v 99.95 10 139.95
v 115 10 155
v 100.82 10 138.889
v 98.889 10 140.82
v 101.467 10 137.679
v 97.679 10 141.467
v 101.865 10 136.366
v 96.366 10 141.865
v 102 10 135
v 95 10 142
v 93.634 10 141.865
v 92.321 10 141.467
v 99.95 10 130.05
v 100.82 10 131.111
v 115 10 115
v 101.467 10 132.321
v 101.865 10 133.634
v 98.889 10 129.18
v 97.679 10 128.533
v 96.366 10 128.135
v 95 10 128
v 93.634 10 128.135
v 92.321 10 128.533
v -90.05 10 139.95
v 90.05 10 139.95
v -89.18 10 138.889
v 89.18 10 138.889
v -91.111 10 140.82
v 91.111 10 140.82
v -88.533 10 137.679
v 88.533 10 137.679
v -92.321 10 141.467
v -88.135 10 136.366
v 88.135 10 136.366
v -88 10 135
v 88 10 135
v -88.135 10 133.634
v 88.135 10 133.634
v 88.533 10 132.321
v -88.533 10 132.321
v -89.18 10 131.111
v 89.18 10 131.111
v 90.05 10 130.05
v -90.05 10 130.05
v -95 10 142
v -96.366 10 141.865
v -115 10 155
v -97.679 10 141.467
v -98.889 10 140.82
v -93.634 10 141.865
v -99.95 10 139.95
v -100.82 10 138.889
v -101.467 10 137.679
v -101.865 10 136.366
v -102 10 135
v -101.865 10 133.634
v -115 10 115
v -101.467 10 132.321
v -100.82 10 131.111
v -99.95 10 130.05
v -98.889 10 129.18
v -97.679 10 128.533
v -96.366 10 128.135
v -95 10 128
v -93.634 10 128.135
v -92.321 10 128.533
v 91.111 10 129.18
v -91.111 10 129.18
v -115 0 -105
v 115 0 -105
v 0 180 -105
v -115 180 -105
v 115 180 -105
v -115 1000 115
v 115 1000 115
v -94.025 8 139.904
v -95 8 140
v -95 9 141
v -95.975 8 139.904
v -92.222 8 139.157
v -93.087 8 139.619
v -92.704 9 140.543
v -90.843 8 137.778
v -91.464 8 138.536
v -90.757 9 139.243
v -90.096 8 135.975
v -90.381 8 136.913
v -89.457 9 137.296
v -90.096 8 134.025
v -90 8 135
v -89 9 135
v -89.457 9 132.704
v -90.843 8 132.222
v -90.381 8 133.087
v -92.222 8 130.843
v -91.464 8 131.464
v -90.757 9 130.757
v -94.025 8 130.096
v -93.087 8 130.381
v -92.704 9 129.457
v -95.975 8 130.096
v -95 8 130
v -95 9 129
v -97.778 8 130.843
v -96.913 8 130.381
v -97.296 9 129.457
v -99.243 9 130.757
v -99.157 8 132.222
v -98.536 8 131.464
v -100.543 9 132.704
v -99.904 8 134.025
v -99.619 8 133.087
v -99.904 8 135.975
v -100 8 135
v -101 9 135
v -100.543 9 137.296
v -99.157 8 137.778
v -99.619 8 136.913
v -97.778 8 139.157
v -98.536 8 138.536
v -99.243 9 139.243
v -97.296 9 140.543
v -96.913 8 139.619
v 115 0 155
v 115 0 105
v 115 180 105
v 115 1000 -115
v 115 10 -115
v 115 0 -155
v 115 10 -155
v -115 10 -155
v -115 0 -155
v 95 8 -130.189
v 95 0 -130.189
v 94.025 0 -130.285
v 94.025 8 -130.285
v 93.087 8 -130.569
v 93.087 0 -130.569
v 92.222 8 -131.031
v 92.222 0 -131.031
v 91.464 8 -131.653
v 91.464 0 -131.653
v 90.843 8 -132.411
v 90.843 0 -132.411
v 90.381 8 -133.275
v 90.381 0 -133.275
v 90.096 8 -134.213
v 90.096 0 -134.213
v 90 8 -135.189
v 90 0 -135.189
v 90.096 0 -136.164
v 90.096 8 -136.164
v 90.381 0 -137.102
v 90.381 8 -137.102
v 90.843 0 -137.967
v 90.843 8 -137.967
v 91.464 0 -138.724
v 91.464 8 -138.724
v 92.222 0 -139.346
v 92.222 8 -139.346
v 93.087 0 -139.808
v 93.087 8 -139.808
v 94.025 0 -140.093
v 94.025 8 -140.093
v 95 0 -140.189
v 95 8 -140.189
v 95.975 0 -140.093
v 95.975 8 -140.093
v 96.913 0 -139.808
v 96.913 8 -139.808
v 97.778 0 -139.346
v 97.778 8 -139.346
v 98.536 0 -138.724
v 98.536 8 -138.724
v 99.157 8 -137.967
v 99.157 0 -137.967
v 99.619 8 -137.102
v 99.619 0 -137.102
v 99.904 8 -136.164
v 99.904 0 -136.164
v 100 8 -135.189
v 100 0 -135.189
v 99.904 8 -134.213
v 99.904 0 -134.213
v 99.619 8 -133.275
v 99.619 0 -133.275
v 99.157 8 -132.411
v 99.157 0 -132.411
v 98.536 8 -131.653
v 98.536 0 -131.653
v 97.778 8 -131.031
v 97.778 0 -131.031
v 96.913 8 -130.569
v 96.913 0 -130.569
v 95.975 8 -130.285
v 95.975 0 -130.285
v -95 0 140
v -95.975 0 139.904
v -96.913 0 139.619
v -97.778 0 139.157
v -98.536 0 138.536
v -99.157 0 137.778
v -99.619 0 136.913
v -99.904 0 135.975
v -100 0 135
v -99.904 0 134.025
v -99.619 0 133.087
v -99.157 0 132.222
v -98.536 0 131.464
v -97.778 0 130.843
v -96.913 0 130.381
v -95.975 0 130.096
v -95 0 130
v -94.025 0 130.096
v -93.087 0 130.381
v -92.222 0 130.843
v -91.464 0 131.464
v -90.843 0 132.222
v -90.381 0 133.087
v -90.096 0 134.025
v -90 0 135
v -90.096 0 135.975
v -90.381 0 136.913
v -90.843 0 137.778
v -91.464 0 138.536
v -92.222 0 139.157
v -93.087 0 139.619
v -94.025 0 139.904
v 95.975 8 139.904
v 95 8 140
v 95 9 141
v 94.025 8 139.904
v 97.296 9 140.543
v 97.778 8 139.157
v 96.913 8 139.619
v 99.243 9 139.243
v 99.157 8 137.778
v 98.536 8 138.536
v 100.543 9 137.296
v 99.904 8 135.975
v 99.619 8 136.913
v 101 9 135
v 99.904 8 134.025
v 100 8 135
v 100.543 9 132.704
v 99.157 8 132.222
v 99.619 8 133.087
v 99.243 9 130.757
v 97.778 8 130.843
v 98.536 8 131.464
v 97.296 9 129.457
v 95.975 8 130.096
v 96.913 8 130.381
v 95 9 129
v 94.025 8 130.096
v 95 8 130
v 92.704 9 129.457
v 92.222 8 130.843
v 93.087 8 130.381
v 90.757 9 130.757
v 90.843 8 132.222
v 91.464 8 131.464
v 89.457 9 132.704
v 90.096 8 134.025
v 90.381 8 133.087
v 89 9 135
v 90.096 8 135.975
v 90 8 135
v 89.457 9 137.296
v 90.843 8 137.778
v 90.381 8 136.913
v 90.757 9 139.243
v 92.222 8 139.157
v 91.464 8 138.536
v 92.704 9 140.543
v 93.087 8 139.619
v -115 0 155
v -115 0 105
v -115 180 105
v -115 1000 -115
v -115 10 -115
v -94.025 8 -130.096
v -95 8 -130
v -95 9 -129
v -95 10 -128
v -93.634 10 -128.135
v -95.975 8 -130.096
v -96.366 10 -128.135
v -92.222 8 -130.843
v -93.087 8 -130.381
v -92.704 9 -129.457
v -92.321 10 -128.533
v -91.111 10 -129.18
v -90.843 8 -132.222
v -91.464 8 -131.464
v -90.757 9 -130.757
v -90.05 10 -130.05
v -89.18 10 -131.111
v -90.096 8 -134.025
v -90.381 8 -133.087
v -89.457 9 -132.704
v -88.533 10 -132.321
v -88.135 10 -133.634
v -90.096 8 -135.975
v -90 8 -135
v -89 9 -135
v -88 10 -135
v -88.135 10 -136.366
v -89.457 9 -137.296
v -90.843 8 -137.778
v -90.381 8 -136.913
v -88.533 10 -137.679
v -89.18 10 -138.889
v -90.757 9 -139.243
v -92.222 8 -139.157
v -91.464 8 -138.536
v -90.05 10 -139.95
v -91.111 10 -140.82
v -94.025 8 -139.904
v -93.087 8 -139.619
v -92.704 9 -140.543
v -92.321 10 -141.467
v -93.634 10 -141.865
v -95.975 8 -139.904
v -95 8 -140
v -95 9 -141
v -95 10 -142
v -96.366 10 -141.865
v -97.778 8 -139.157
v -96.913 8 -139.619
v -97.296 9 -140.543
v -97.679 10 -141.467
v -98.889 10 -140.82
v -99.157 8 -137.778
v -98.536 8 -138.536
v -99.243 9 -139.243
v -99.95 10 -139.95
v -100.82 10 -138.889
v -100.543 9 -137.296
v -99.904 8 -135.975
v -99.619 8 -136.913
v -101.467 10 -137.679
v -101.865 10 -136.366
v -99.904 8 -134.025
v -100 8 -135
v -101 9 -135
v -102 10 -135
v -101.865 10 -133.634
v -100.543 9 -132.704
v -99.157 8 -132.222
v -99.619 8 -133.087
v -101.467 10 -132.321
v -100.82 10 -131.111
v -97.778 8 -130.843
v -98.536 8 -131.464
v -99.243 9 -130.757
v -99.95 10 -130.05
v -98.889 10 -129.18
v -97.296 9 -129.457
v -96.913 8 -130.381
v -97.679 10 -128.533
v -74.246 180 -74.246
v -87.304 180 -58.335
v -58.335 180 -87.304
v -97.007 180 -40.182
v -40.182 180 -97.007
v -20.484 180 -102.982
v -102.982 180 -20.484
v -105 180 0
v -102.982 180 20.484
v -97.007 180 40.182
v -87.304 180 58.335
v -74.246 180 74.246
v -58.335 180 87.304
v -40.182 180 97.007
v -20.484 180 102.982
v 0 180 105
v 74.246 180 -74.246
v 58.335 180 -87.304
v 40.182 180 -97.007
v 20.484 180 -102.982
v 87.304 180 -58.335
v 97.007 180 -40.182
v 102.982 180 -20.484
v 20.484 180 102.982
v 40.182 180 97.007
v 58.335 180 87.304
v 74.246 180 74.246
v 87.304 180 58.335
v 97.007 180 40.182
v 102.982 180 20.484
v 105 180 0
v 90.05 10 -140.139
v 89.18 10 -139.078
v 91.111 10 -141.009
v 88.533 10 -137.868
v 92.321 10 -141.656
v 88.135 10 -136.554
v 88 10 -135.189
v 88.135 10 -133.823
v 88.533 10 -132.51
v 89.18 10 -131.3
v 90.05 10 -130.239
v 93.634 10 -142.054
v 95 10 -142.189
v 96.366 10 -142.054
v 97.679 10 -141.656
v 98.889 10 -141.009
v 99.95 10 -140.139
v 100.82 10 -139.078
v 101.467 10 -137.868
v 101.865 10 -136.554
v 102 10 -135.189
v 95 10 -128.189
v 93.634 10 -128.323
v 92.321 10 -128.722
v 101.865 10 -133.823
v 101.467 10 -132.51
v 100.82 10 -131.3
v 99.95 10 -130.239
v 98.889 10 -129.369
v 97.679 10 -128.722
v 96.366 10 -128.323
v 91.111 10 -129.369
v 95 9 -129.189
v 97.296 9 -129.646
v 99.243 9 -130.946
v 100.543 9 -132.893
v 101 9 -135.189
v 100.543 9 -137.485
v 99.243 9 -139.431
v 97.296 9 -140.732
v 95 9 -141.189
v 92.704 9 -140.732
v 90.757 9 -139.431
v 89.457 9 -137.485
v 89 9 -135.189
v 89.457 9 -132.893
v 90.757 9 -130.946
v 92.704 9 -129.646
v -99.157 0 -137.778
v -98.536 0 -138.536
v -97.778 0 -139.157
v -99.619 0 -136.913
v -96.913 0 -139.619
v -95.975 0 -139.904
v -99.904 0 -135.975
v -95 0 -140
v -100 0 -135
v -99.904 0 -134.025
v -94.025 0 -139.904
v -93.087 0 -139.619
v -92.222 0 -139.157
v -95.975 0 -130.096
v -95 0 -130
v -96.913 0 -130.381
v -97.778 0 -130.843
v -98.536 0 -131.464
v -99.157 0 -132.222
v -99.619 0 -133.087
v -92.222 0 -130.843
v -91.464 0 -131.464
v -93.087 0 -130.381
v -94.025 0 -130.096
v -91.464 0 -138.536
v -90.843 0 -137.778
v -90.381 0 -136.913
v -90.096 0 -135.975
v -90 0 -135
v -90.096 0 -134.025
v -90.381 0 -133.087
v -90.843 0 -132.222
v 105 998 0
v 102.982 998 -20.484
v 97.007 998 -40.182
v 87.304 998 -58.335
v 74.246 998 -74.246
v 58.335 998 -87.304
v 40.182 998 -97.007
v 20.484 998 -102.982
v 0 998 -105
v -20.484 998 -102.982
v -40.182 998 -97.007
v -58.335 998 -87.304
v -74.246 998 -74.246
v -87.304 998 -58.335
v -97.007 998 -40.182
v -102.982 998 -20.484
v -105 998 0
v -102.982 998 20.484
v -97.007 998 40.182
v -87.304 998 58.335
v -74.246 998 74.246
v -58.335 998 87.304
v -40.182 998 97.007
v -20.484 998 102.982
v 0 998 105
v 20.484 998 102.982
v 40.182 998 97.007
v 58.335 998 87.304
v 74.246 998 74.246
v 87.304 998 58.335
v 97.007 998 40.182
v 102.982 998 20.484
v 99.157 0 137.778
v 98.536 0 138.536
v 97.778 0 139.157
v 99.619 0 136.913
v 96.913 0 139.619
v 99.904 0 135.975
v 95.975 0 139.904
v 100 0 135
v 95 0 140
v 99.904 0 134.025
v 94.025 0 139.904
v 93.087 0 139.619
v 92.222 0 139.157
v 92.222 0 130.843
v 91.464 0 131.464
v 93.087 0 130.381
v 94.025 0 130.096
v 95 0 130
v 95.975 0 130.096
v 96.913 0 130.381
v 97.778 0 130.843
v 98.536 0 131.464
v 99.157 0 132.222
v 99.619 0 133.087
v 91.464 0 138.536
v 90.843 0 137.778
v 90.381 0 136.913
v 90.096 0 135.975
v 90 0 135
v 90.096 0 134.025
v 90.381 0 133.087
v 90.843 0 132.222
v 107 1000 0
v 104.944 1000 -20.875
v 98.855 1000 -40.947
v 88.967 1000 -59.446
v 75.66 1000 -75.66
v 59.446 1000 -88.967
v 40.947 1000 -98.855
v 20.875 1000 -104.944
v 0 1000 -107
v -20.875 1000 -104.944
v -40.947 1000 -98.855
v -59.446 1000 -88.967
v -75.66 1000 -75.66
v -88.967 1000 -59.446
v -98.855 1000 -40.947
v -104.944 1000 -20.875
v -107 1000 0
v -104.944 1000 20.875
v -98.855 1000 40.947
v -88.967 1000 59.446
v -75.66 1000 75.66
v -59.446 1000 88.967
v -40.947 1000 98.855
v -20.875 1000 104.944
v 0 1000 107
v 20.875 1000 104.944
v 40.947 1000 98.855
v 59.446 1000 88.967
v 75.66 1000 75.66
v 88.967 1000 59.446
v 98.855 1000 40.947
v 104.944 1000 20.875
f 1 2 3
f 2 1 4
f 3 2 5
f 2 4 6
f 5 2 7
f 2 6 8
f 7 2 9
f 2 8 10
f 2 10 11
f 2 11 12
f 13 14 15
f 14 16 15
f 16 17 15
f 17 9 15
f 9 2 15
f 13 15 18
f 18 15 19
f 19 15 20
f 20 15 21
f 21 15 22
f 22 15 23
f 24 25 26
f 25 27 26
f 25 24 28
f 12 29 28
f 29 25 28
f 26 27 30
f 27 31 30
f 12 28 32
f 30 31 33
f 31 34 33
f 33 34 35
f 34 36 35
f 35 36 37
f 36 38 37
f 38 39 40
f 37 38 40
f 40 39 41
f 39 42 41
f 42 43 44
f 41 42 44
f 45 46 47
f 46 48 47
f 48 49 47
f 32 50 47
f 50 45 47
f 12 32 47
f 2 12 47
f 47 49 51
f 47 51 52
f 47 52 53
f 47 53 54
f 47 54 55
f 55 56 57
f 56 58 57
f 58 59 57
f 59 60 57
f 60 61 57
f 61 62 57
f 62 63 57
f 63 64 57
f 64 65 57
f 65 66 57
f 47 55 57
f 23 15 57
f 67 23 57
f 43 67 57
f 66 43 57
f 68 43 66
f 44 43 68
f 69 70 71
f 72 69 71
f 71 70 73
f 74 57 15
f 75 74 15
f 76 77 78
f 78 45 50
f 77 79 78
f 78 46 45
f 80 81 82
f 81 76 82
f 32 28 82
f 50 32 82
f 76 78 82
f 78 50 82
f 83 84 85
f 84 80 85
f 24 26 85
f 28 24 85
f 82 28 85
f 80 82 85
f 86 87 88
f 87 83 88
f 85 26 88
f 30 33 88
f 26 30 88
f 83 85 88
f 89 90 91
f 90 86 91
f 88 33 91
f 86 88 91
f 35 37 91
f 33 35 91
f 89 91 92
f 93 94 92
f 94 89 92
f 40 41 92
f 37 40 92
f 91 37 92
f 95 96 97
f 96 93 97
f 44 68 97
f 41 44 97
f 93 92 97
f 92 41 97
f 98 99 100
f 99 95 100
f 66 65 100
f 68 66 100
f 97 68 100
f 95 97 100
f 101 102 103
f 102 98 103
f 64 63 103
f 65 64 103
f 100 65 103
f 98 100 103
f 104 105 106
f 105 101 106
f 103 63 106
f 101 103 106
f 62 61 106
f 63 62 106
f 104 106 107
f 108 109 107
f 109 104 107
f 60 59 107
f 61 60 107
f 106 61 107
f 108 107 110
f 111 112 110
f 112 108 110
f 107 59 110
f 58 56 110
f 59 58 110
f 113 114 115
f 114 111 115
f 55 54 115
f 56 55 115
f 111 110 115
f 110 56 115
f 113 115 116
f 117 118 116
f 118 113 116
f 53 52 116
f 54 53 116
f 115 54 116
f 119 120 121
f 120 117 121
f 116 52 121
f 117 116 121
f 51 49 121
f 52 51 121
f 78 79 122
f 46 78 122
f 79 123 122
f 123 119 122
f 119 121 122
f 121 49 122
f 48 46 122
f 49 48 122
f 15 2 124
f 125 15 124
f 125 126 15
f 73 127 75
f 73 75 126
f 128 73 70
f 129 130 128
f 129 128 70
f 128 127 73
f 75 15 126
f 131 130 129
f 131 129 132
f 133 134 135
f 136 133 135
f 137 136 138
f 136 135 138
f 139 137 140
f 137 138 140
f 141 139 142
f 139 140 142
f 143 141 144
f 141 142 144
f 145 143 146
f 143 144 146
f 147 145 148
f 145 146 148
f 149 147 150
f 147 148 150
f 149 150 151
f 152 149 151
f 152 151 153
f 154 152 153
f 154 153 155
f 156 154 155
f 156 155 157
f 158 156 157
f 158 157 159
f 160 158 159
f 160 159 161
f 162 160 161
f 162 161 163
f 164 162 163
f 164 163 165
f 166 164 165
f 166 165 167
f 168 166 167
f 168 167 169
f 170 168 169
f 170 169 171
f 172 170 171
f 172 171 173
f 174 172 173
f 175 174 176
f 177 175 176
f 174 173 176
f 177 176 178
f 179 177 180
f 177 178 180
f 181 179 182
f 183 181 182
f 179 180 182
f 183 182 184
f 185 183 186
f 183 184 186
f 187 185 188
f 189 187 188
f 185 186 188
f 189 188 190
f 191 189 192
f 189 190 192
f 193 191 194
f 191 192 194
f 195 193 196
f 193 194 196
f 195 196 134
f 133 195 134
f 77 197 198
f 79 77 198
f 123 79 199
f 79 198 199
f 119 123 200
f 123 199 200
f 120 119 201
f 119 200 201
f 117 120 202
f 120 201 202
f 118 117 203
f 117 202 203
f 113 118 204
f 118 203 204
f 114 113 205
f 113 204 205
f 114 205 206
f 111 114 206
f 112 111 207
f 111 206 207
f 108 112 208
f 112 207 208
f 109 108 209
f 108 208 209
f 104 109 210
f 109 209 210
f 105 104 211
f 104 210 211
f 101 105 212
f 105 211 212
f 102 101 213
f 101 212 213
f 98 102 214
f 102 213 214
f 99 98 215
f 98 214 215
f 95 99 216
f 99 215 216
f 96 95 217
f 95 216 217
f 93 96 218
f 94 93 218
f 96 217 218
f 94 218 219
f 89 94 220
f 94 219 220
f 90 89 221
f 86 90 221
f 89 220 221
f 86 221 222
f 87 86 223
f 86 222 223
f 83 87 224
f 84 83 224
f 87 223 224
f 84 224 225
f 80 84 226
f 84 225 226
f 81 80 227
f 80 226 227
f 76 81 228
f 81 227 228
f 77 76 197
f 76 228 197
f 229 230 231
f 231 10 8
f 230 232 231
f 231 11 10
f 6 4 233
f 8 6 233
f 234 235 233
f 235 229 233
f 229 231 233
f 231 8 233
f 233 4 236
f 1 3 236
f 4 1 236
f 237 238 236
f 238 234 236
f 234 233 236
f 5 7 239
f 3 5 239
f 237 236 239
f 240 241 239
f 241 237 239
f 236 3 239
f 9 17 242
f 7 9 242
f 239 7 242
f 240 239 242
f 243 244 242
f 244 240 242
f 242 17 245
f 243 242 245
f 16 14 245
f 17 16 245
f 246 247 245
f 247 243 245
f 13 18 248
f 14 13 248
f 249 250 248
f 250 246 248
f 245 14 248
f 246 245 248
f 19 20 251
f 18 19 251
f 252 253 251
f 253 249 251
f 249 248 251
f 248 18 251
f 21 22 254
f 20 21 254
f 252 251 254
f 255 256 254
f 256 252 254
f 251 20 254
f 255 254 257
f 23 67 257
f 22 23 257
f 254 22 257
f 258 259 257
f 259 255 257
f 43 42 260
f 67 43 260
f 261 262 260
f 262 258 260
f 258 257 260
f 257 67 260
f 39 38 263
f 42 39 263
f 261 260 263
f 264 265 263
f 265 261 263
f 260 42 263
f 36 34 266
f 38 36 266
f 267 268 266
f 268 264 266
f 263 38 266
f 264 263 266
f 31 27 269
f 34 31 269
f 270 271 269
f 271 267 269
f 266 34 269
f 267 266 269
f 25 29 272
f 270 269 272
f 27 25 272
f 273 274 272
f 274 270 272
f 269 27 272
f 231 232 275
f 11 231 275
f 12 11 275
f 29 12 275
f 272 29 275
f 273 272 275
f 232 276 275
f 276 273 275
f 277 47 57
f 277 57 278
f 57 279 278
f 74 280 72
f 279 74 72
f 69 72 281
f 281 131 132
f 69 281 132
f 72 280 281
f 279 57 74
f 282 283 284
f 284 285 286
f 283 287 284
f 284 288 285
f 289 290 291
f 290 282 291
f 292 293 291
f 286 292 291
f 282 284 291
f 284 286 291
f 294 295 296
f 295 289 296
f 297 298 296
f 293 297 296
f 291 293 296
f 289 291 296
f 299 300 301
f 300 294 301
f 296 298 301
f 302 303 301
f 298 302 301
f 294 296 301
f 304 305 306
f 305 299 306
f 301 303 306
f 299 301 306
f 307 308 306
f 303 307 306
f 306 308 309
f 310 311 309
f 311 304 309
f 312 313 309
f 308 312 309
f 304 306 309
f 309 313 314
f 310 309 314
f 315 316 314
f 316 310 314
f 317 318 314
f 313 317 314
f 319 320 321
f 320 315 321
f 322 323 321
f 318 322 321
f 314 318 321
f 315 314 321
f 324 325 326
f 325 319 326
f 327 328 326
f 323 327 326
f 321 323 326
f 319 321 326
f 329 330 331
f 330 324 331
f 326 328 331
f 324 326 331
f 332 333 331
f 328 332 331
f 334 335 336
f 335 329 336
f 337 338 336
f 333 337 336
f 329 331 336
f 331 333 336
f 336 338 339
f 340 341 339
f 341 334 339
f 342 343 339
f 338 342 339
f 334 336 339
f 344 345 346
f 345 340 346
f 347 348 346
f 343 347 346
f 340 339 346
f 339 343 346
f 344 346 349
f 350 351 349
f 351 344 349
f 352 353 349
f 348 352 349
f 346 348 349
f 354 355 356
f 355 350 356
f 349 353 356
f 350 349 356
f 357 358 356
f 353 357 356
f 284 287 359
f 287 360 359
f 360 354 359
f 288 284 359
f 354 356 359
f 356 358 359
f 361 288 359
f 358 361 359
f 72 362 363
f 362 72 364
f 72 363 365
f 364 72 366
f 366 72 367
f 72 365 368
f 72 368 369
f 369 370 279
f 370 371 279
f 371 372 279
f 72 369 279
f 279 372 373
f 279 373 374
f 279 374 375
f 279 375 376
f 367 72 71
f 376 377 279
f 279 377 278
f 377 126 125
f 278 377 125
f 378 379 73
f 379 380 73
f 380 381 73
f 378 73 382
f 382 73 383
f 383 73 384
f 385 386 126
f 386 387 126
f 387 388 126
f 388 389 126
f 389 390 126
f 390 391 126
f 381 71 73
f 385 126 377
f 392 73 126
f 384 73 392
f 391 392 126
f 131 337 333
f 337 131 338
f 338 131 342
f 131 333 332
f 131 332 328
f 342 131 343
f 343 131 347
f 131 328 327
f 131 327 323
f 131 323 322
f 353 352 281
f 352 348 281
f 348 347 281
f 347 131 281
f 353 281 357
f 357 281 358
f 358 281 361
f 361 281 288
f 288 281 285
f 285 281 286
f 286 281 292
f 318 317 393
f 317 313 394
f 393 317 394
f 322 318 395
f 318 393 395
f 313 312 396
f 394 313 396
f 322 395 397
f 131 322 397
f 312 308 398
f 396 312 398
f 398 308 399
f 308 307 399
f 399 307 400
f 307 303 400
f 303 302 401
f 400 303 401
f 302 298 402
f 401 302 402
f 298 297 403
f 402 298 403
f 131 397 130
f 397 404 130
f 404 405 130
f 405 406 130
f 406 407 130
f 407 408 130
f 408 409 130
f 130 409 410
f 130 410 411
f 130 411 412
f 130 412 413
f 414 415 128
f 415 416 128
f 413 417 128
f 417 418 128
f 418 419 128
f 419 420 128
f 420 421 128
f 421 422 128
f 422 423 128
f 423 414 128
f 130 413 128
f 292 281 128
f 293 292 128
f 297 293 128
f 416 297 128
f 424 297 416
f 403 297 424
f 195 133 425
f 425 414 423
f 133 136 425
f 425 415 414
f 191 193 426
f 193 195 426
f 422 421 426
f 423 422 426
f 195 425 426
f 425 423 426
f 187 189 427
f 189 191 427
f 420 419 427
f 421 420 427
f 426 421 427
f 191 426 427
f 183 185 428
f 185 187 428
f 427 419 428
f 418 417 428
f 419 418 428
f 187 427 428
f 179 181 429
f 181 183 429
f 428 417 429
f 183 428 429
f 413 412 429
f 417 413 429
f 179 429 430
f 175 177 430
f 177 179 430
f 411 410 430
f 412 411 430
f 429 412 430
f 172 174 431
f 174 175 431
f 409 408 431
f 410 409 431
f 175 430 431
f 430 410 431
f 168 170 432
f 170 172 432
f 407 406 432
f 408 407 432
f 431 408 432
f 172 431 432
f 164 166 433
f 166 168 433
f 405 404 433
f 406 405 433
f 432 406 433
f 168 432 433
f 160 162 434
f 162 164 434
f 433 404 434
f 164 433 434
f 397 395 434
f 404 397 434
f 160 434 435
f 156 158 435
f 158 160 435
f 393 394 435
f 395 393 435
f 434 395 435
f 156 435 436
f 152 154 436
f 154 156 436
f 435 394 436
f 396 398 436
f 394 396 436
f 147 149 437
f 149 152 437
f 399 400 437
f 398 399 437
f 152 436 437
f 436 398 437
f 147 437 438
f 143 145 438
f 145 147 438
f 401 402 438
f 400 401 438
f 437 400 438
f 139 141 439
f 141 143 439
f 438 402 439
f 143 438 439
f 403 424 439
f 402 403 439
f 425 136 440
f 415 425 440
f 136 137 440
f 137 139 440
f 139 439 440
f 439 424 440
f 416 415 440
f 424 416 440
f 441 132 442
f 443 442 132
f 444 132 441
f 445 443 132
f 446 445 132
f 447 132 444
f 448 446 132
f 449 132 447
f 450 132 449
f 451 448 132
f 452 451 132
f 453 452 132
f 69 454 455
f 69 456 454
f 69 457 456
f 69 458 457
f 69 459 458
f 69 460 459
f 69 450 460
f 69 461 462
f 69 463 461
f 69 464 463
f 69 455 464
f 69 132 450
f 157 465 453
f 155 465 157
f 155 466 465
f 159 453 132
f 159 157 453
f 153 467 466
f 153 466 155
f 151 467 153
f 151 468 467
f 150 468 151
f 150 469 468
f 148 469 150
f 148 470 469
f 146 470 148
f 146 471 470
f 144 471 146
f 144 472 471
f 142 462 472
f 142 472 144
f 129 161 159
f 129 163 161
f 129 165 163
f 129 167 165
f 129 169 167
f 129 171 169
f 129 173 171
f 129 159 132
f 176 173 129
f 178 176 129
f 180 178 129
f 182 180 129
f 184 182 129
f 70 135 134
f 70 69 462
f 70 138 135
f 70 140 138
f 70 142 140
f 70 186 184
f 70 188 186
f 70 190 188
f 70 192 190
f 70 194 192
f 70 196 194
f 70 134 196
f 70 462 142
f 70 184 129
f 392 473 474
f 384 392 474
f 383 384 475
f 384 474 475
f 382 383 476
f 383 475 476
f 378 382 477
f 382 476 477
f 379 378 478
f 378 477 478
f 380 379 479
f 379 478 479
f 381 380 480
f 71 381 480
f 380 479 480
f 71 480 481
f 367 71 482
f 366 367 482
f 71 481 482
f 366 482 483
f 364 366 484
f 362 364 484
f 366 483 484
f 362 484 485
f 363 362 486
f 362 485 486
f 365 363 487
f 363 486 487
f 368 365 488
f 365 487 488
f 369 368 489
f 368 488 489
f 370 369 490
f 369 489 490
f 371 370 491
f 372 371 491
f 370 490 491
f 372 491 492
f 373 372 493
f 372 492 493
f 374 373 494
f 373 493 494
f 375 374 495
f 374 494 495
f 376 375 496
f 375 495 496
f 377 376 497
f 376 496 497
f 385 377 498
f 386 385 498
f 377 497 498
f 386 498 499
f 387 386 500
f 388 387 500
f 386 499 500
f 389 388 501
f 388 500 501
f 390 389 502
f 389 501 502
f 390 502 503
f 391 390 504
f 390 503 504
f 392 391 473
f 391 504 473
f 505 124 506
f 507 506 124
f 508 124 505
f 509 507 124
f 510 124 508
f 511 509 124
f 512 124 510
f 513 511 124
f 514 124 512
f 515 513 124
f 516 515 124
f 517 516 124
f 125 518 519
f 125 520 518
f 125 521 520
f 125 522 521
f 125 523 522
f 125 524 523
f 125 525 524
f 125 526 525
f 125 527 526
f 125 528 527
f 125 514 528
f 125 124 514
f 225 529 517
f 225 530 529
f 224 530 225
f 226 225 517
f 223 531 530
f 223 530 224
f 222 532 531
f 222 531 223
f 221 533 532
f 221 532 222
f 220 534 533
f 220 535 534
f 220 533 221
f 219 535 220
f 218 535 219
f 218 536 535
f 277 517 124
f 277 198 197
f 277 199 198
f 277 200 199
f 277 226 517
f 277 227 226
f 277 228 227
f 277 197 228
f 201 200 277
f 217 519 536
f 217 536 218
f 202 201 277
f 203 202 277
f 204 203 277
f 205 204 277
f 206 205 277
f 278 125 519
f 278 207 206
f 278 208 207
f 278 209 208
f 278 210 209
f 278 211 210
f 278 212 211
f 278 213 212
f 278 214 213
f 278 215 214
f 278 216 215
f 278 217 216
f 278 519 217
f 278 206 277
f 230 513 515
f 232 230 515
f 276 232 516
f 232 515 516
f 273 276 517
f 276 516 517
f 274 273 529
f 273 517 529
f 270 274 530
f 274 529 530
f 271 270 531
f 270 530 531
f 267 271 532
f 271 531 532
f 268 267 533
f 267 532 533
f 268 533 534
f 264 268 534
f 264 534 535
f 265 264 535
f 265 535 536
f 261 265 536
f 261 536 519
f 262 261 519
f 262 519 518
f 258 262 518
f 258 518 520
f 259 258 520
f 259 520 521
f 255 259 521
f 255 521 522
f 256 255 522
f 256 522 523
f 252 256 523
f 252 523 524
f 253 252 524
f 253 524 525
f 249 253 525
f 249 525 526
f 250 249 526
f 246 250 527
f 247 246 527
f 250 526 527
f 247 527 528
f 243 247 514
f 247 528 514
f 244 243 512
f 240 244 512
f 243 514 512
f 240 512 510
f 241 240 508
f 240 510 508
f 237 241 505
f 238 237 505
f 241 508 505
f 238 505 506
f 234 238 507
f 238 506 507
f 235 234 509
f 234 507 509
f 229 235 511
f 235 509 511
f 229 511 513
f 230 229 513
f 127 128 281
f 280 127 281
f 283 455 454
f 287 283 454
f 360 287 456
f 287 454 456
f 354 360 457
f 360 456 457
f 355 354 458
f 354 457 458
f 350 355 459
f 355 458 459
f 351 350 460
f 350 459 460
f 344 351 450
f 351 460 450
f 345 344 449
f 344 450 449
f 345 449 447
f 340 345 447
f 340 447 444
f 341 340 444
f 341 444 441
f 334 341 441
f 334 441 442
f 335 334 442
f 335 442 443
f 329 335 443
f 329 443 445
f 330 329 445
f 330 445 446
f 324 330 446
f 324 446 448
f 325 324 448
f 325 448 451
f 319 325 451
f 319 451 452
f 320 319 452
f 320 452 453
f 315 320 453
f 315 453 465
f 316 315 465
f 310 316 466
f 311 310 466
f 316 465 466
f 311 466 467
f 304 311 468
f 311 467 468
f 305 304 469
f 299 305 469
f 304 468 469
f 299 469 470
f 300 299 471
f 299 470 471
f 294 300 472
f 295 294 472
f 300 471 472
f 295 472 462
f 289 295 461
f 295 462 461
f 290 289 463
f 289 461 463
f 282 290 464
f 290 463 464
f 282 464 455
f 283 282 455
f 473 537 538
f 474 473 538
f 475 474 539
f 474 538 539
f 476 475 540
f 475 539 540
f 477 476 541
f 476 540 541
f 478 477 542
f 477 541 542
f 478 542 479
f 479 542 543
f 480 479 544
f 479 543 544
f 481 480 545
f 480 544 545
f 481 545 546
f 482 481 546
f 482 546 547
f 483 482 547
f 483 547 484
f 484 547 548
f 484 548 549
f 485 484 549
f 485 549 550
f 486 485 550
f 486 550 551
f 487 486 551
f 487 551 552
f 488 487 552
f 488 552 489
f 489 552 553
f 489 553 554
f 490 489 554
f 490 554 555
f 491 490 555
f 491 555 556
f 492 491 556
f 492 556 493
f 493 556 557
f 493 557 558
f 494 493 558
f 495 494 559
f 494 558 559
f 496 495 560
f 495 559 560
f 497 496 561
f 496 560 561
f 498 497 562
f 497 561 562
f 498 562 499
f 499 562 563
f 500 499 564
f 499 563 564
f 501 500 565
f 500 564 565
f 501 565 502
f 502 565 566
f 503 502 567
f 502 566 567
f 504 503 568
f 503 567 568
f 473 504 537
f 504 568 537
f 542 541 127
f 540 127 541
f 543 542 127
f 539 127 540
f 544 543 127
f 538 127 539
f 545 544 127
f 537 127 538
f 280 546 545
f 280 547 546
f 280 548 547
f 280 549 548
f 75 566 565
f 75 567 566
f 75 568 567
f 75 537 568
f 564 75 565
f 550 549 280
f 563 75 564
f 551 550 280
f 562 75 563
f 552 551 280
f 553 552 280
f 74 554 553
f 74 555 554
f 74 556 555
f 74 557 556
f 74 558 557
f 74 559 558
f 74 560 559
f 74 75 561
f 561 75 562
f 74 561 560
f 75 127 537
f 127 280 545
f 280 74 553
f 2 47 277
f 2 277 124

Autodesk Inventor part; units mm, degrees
ref_plane "YZ Plane" through (0, 0, 0) normal (1, 0, 0) x (0, 1, 0)
ref_plane "XZ Plane" through (0, 0, 0) normal (0, 1, 0) x (-1, 0, 0)
ref_plane "XY Plane" through (0, 0, 0) normal (0, 0, 1) x (1, 0, 0)
sketch "Skizze1" plane through (0, 0, 0) normal (0, 1, 0) x (-1, 0, 0)
  line L0 (115, 115) -> (-115, 115)
  line L1 (-115, 115) -> (-115, -115)
  line L2 (-115, -115) -> (115, -115)
  line L3 (115, -115) -> (115, 115)
  point P0 (0, 0)
  dimension "d0" = 230
  dimension "d1" = 230
extrude "Extrusion1" add sketch "Skizze1" along normal blind 1000
sketch "Skizze2" plane through (115, 0, 115) normal (1, 0, 0) x (0, 0, -1)
  line L0 (0, 0) -> (230, 0) projected
  line L1 (10, 0) -> (220, 0)
  line L2 (220, 0) -> (220, 180)
  line L3 (220, 180) -> (10, 180)
  line L4 (10, 180) -> (10, 0)
  point P0 (115, 0)
  dimension "d4" = 210
  dimension "d5" = 180
extrude "Extrusion2" cut sketch "Skizze2" against normal blind 230
sketch "Skizze3" plane through (0, 1000, 0) normal (0, 1, 0) x (1, 0, 0)
  circle A0 centre (0, 0) radius 105
  dimension "d8" = 210
extrude "Extrusion3" cut sketch "Skizze3" against normal blind 820
chamfer "Fase1" distance 2 angle 45 1 edges at (-105, 1000, 0)
sketch "Skizze4" plane through (115, 0, -115) normal (0, 0, -1) x (-1, 0, 0)
  line L0 (230, 0) -> (0, 0) projected
  line L1 (230, 180) -> (230, 0) projected
  line L2 (0, 0) -> (230, 0)
  line L3 (230, 0) -> (230, 10)
  line L4 (230, 10) -> (0, 10)
  line L5 (0, 10) -> (0, 0)
  point P0 (115, 0)
  dimension "d14" = 10
extrude "Extrusion4" add sketch "Skizze4" along normal blind 40
sketch "Skizze5" plane through (-115, 0, 115) normal (0, 0, 1) x (1, 0, 0)
  line L0 (230, 0) -> (0, 0) projected
  line L1 (230, 180) -> (230, 0) projected
  line L2 (0, 0) -> (230, 0)
  line L3 (230, 0) -> (230, 10)
  line L4 (230, 10) -> (0, 10)
  line L5 (0, 10) -> (0, 0)
  point P0 (115, 0)
  dimension "d17" = 10
extrude "Extrusion5" add sketch "Skizze5" along normal blind 40
sketch "Skizze6" plane through (-115, 10, 115) normal (0, 1, 0) x (1, 0, 0)
  line L0 (230, -40) -> (0, -40) projected
  line L1 (0, -40) -> (20, -40)
  line L2 (20, -40) -> (20, -20)
  line L3 (20, -20) -> (0, -20)
  line L4 (0, -20) -> (0, -40)
  line L5 (230, 0) -> (230, -40) projected
  line L6 (230, -40) -> (210, -40)
  line L7 (210, -40) -> (210, -20)
  line L8 (210, -20) -> (230, -20)
  line L9 (230, -20) -> (230, -40)
  line L10 (230, 270.1888) -> (210, 270.1888)
  line L11 (210, 270.1888) -> (210, 250.1888)
  line L12 (210, 250.1888) -> (230, 250.1888)
  line L13 (230, 250.1888) -> (230, 270.1888)
  line L14 (0, 270) -> (230, 270) projected
  line L15 (0, 270) -> (20, 270)
  line L16 (20, 270) -> (20, 250)
  line L17 (20, 250) -> (0, 250)
  line L18 (0, 250) -> (0, 270)
  point P0 (115, 115)
  dimension "d20" = 20
  dimension "d21" = 20
  dimension "d22" = 20
  dimension "d23" = 20
  dimension "d24" = 20
hole "Bohrung1" at (-95, 10, 135) at (95, 10, 135) at (-95, 10, -135) at (95, 10, -135.1888) direction (0, -1, 0) diameter 10 depth 10 tip angle 118 countersink diameter 14 countersink angle 90
properties part number "Magazin"
